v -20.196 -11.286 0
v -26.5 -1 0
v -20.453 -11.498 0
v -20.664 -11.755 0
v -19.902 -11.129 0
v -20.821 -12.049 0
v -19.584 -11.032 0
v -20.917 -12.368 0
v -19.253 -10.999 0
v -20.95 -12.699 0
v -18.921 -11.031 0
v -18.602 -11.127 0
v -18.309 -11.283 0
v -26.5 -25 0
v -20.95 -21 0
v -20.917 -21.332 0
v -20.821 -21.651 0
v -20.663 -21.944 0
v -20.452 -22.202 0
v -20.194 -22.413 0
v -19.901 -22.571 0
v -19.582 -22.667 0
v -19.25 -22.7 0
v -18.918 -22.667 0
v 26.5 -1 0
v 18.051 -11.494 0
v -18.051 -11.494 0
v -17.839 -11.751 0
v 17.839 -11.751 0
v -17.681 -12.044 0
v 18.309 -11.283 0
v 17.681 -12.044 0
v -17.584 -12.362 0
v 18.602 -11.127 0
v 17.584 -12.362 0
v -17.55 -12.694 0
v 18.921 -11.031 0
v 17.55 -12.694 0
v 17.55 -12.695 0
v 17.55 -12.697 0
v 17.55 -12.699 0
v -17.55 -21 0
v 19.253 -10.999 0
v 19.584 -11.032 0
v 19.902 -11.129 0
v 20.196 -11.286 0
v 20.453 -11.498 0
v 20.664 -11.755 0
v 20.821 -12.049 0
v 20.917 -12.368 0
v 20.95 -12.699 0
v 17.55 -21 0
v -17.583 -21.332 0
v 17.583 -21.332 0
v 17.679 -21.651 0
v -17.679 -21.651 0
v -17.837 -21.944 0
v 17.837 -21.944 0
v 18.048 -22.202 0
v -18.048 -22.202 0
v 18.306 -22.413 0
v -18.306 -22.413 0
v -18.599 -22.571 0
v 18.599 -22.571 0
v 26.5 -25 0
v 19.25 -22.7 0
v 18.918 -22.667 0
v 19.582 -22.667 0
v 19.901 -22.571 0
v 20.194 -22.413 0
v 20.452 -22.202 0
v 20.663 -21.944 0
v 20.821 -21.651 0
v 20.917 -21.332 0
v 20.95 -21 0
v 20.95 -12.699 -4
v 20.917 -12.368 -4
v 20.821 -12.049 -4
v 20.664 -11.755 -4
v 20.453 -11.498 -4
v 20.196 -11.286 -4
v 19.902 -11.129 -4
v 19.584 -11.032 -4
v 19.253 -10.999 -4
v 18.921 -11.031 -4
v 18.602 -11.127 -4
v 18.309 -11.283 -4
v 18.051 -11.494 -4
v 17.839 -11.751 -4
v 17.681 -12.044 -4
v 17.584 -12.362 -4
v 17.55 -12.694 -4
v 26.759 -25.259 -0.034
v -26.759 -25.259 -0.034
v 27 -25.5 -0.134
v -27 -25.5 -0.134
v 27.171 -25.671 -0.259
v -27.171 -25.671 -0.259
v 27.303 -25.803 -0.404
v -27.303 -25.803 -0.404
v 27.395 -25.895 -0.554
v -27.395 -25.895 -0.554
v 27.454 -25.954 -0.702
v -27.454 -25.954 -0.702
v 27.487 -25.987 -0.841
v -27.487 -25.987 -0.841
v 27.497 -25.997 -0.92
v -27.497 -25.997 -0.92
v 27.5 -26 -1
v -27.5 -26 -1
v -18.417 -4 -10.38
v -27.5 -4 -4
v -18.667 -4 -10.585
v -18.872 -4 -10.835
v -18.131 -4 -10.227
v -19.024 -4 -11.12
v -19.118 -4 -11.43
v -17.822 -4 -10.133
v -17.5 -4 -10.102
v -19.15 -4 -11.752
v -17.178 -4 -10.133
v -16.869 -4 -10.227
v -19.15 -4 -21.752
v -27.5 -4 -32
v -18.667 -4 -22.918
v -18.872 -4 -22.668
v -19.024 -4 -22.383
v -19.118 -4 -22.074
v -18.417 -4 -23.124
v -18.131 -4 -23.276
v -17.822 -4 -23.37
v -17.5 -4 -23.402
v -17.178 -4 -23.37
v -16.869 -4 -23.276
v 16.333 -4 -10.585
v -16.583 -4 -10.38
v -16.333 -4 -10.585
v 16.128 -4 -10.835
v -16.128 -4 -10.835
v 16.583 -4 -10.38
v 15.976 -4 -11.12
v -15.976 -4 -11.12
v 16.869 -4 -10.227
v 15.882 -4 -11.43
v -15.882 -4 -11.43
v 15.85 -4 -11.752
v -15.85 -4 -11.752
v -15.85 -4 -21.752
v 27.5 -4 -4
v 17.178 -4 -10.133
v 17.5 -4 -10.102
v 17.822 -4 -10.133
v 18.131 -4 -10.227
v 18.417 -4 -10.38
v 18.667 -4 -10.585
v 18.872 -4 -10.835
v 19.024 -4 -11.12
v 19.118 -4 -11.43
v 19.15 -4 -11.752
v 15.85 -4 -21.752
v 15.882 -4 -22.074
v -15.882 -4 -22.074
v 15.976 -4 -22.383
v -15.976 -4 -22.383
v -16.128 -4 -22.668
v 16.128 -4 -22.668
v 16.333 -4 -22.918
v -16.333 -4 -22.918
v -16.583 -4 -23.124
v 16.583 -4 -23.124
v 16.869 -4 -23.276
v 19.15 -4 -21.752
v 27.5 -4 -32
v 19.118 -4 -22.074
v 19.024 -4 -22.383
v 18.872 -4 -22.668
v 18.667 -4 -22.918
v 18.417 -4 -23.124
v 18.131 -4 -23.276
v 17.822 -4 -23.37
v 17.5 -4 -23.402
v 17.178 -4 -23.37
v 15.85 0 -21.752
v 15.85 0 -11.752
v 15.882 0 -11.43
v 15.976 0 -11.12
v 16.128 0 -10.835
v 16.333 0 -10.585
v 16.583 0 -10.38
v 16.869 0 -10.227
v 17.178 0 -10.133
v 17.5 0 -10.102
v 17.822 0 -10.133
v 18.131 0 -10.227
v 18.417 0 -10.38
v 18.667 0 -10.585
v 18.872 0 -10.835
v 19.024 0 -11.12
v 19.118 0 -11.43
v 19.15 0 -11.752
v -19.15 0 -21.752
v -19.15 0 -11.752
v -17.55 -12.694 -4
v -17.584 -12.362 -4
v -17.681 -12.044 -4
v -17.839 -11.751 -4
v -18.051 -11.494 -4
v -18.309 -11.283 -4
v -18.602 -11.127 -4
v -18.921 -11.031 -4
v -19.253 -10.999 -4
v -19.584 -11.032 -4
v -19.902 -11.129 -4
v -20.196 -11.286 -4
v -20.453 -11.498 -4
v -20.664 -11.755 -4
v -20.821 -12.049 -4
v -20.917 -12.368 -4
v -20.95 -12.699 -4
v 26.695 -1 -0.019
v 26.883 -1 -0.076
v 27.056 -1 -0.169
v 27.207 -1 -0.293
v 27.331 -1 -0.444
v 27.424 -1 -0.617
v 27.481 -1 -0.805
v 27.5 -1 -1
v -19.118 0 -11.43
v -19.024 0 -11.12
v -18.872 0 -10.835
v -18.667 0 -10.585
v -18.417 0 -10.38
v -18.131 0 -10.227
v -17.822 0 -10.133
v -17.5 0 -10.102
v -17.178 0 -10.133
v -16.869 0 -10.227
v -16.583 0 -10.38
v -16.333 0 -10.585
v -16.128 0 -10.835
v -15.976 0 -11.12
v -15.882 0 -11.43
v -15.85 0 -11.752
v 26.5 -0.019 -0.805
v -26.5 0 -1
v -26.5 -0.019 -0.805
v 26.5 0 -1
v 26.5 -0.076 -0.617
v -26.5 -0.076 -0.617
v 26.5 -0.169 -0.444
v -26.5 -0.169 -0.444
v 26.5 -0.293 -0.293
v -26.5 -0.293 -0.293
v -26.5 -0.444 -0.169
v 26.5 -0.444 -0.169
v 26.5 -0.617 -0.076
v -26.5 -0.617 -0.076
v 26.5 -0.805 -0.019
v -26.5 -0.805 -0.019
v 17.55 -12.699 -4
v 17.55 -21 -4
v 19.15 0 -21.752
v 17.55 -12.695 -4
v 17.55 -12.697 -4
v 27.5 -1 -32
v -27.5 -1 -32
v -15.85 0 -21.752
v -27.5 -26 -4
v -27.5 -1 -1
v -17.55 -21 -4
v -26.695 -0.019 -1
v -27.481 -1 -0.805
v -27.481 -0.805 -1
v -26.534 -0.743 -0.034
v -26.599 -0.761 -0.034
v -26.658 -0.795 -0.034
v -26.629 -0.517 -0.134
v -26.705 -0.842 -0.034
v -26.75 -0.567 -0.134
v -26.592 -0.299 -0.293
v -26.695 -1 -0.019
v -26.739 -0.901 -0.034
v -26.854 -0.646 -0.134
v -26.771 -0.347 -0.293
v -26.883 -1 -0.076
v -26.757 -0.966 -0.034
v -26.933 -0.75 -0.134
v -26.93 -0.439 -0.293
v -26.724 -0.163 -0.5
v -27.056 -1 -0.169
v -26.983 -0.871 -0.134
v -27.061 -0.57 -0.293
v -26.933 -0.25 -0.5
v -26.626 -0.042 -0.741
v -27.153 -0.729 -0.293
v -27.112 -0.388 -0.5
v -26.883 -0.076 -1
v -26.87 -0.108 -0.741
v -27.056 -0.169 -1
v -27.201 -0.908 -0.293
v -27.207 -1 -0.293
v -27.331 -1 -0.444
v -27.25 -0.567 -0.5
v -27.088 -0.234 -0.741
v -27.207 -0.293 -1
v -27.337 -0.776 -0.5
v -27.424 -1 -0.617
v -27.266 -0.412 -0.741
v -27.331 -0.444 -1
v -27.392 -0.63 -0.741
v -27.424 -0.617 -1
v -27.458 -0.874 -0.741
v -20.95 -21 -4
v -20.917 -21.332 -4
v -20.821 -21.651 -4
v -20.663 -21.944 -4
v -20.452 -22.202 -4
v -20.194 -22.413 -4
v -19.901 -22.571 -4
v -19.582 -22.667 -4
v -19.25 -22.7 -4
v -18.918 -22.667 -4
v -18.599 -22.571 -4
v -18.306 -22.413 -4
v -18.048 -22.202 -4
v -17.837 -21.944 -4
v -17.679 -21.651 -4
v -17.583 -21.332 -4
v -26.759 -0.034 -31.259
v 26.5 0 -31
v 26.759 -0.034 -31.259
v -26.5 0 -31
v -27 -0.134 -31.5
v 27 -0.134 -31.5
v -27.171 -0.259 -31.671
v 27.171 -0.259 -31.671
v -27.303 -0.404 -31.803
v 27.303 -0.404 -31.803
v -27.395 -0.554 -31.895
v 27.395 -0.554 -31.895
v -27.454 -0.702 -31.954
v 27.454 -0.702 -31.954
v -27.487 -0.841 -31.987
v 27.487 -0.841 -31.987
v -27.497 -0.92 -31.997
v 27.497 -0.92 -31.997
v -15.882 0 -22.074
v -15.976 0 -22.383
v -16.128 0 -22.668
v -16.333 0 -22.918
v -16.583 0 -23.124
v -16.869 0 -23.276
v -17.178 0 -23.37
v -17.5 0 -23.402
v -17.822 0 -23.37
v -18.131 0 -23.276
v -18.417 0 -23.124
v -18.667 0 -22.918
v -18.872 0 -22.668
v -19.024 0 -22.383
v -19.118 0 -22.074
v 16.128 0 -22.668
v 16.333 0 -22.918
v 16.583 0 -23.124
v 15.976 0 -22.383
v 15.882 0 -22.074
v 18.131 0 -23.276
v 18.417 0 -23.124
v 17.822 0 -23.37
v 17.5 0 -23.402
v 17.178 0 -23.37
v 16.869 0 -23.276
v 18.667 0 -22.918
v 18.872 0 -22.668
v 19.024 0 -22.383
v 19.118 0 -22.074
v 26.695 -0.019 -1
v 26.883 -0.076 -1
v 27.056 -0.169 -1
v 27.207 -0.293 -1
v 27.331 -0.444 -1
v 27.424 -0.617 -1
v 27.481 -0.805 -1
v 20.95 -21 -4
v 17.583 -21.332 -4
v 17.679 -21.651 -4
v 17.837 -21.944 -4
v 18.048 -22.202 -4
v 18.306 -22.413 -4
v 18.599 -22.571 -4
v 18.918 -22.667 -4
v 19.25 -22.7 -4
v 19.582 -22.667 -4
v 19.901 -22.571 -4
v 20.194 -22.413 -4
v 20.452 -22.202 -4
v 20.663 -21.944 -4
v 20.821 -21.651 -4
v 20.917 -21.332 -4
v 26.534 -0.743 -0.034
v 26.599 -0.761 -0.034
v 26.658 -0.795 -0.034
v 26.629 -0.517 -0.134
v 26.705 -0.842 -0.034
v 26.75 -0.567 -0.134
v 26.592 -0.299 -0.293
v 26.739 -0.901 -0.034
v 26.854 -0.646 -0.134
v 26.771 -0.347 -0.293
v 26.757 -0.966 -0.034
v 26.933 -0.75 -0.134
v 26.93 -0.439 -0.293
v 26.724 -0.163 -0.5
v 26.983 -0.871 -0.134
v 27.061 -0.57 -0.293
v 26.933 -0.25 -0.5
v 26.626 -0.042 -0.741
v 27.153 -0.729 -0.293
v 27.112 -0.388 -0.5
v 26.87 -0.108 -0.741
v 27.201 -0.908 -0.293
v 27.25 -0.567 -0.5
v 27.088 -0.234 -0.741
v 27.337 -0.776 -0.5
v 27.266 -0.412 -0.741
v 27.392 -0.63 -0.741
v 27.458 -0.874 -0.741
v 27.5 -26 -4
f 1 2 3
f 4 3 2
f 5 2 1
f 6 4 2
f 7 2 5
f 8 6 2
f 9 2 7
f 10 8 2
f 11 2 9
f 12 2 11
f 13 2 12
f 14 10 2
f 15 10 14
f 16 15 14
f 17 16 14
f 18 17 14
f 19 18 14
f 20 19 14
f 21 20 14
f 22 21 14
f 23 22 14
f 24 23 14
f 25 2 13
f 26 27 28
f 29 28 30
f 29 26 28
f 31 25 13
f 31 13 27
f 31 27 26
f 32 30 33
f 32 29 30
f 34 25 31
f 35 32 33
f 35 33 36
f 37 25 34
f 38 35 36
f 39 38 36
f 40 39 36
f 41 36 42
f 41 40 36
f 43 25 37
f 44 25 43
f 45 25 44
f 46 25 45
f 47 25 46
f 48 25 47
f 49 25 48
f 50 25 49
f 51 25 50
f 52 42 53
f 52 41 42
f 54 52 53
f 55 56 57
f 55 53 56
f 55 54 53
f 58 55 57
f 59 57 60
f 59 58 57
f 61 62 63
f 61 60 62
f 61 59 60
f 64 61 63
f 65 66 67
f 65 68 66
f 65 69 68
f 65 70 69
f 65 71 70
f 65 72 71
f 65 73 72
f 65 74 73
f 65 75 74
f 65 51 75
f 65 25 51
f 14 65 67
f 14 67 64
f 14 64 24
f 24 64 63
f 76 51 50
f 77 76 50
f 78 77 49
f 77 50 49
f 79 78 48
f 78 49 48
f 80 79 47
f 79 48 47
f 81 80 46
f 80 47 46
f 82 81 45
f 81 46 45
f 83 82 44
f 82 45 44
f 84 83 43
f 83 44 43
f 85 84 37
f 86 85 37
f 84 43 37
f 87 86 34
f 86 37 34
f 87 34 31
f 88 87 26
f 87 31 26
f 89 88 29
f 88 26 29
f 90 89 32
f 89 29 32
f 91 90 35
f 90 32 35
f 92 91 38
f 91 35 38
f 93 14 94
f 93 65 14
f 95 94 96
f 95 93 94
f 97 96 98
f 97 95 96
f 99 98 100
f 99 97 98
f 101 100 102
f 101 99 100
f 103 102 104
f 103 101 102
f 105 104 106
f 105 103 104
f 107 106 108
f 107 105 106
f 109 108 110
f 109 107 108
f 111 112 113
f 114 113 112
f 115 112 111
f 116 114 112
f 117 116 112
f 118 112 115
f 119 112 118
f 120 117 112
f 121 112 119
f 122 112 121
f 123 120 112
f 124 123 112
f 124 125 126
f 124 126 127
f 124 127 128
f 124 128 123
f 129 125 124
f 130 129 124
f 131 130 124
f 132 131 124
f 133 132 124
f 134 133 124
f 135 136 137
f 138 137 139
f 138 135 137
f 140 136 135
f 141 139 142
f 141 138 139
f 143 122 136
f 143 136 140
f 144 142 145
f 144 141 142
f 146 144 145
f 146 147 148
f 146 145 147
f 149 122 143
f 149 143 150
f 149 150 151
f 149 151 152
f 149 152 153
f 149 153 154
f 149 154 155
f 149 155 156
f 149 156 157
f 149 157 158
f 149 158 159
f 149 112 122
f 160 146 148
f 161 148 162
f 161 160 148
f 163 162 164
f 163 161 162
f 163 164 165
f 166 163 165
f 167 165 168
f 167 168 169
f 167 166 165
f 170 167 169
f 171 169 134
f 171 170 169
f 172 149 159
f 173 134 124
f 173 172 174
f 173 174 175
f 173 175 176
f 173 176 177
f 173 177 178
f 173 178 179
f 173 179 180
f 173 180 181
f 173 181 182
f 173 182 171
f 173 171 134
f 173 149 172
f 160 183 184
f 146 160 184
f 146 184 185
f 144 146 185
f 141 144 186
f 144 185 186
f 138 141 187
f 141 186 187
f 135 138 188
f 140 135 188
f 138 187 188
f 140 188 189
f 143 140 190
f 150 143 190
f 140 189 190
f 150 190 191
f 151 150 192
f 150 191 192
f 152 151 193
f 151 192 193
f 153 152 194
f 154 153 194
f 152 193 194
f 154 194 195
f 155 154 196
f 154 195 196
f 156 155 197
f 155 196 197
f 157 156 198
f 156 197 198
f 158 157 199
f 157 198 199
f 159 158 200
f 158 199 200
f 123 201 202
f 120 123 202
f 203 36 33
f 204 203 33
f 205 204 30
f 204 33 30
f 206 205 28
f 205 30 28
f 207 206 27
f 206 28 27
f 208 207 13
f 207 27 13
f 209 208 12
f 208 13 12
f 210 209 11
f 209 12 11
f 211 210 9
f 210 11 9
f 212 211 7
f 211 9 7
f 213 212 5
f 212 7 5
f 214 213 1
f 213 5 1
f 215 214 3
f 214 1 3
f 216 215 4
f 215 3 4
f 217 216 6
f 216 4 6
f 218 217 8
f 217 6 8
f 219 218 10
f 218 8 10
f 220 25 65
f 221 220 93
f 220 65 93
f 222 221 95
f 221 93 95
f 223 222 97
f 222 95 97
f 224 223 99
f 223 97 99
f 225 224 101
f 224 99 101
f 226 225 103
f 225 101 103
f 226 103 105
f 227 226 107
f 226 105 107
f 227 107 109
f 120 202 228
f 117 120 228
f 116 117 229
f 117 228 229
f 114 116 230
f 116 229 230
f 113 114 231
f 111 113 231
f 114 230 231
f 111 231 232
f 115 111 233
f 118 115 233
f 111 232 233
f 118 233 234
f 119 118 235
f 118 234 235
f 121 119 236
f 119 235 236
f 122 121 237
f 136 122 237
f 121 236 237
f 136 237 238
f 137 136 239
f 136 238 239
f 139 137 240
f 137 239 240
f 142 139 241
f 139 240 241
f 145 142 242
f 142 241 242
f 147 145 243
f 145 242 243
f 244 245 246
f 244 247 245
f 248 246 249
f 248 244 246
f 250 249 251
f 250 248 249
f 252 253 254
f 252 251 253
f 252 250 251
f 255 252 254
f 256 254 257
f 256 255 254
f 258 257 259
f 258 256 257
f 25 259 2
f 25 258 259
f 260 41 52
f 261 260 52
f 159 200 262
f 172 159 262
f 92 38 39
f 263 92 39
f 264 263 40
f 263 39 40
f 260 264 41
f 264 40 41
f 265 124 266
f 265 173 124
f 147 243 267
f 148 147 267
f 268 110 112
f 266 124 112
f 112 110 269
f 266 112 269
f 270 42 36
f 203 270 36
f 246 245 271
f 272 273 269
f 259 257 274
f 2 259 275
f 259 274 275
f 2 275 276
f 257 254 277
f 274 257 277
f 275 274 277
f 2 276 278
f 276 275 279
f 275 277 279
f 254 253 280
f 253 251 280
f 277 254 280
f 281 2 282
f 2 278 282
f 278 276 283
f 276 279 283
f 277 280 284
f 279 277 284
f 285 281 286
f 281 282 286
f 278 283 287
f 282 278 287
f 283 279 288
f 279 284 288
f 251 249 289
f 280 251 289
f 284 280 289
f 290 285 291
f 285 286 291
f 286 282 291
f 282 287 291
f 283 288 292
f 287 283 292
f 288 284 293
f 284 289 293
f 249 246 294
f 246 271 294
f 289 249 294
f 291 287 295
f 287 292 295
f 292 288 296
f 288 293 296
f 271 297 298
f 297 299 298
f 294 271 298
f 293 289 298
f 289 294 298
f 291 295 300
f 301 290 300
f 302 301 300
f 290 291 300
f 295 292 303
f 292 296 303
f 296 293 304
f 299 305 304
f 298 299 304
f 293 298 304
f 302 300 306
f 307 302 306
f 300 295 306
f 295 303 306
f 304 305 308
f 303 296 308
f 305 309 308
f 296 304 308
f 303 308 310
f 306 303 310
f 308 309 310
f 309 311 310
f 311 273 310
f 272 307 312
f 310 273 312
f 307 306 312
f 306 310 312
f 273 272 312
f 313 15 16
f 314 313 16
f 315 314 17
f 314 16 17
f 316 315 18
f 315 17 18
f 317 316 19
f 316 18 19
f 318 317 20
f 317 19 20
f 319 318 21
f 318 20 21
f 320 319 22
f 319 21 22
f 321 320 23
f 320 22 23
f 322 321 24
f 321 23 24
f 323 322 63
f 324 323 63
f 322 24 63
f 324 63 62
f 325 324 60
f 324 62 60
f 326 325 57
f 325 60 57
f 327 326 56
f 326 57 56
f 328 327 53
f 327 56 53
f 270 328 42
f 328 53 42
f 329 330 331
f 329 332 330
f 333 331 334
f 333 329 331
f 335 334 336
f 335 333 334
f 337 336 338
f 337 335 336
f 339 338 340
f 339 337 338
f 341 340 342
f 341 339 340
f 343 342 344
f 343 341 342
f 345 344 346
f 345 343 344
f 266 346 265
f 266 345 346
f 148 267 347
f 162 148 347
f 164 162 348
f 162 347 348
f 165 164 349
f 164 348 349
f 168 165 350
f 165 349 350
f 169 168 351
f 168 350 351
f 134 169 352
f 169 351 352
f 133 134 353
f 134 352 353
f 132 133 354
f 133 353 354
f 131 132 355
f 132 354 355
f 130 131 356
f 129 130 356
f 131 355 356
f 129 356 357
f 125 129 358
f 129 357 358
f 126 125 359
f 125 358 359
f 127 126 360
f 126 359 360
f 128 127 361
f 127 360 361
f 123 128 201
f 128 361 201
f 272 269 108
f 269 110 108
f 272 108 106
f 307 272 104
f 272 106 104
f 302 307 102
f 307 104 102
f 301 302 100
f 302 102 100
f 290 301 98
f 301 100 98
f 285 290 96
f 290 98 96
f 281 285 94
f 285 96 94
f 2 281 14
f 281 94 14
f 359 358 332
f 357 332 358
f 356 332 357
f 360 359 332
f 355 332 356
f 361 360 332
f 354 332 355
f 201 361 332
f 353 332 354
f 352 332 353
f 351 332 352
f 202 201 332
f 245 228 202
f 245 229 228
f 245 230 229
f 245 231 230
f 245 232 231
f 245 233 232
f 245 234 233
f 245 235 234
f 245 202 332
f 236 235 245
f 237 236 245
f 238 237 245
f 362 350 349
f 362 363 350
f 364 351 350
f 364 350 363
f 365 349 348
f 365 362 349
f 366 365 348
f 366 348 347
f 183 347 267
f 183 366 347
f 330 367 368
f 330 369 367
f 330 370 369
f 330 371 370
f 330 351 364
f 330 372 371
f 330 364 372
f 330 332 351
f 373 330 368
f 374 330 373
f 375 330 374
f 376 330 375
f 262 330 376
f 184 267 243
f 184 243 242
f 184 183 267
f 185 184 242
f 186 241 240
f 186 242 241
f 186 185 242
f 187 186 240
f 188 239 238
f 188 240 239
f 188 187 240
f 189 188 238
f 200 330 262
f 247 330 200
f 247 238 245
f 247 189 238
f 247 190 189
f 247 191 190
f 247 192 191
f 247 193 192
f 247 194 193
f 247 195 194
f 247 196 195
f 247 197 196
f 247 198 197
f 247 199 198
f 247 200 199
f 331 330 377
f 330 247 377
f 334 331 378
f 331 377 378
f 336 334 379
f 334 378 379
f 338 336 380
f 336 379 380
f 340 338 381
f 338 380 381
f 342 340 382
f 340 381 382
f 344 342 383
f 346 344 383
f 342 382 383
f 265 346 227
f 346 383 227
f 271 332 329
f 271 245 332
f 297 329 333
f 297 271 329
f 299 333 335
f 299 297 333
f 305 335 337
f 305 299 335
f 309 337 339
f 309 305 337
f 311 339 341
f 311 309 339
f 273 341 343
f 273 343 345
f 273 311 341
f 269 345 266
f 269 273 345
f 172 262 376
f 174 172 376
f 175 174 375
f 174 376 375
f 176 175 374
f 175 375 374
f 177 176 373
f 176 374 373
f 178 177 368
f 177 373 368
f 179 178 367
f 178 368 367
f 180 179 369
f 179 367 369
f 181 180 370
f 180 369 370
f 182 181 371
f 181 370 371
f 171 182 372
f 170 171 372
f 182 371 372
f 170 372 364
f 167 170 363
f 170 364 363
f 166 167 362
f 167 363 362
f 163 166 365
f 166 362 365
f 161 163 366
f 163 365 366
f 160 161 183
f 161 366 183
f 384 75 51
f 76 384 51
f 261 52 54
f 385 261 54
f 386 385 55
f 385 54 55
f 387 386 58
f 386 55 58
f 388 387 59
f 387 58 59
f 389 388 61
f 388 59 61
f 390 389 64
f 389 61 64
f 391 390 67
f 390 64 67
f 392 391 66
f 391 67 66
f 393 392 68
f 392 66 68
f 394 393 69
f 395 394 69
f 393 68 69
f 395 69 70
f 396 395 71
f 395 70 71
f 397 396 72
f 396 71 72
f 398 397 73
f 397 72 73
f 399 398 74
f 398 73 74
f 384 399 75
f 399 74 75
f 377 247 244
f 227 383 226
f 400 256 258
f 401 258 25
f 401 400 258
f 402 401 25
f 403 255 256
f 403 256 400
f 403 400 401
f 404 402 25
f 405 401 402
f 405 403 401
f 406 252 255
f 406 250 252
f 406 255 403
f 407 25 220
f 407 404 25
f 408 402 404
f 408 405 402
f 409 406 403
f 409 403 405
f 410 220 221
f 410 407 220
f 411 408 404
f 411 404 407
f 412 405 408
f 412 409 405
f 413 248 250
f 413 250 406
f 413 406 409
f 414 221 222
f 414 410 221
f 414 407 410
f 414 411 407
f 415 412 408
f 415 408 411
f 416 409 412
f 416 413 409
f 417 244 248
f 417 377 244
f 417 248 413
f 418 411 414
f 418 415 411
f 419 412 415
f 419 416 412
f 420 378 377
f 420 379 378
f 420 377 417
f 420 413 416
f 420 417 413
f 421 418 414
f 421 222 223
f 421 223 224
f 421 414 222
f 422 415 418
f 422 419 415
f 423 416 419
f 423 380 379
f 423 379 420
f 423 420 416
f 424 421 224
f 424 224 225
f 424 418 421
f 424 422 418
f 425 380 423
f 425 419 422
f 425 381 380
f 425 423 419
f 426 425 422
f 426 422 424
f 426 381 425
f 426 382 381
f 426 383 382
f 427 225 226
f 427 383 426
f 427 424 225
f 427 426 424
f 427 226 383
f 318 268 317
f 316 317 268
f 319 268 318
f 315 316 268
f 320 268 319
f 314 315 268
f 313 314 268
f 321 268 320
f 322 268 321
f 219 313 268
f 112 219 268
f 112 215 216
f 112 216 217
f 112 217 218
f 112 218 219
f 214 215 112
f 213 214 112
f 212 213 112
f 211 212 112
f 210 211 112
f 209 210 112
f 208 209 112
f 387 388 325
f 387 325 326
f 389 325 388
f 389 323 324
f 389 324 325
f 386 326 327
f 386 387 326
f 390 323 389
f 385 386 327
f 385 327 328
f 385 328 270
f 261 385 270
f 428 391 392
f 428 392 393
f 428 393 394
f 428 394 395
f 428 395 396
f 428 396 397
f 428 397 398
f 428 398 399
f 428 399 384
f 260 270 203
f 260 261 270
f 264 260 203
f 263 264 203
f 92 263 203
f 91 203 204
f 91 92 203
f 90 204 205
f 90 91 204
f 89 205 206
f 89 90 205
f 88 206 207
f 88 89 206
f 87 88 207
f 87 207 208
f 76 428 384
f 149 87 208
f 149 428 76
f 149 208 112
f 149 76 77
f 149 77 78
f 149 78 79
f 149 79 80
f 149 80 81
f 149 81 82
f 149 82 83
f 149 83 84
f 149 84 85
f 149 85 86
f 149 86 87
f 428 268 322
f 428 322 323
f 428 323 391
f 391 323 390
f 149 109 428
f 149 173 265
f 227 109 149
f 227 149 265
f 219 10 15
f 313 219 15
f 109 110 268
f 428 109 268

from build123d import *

# Parameters (mm, degrees)
F1_DEPTH = 27.5
F3_DEPTH = 32.001
F4_R     = 1
F6_DEPTH = 26.001


# Not quite as in the source:
# - ends of sketch curves that miss each other by under 0.0002 mm in the source are joined
# - a feature names something its author has since deleted; it is built from what else it names


with BuildPart() as f1:
    # F0 (on Right) → F1 (new body, symmetric)
    with BuildSketch(Plane.YZ):
        Polygon((0, -32), (0, 0), (-26, 0), (-26, -4), (-4, -4), (-4, -32), align=None)
    extrude(amount=F1_DEPTH, both=True)

    # F2 (on Top) → F3 (cut, through all)
    with BuildSketch(Plane.XY):
        with BuildLine():
            Line((-17.55, -21), (-20.95, -21))
            ThreePointArc((-20.95, -21), (-19.25, -22.7), (-17.55, -21))
        make_face()
        with BuildLine():
            Line((-20.95, -12.6989117458), (-20.95, -21))
            Line((-20.95, -21), (-17.55, -21))
            Line((-17.55, -21), (-17.55, -12.6989117458))
            Line((-17.55, -12.6989117458), (-17.55, -12.6936758503))
            ThreePointArc((-17.55, -12.6936758503), (-19.2526179384, -10.9989137616), (-20.95, -12.6989117458))
        make_face()
        with BuildLine():
            ThreePointArc((17.55, -21), (19.25, -22.7), (20.95, -21))
            Line((20.95, -21), (17.55, -21))
        make_face()
        with BuildLine():
            Line((17.55, -21), (20.95, -21))
            Line((20.95, -21), (20.95, -12.6989117458))
            ThreePointArc((20.95, -12.6989117458), (19.2526179384, -10.9989137616), (17.5500080631, -12.6936758752))
            ThreePointArc((17.5500080631, -12.6936758752), (17.5500020158, -12.6962938074), (17.55, -12.6989117458))
            Line((17.55, -12.6989117458), (17.55, -21))
        make_face()
    extrude(amount=-F3_DEPTH, mode=Mode.SUBTRACT)

    # F4
    f4_edges = [f1.edges().sort_by_distance(p)[0] for p in [
        (0, 0, -32),
        (-27.5, 0, -16),
        (27.5, 0, -16),
        (0, 0, 0),
        (0, -26, 0),
        (-27.5, -13, 0),
        (27.5, -13, 0),
    ]]
    fillet(f4_edges, radius=F4_R)

    # F5 (on face) → F6 (cut, through all)
    with BuildSketch(Plane(origin=(0, 0, 0), x_dir=(-1, 0, 0), z_dir=(0, 1, 0))):
        with BuildLine():
            Line((15.85, -11.7517232777), (15.85, -21.7517232777))
            ThreePointArc((15.85, -21.7517232777), (17.5, -23.4017232777), (19.15, -21.7517232777))
            Line((19.15, -21.7517232777), (19.15, -11.7517232777))
            ThreePointArc((19.15, -11.7517232777), (17.5, -10.1017232777), (15.85, -11.7517232777))
        make_face()
        with BuildLine():
            ThreePointArc((-19.15, -21.7517232777), (-17.5, -23.4017232777), (-15.85, -21.7517232777))
            Line((-15.85, -21.7517232777), (-15.85, -11.7517232777))
            ThreePointArc((-15.85, -11.7517232777), (-17.5, -10.1017232777), (-19.15, -11.7517232777))
            Line((-19.15, -11.7517232777), (-19.15, -21.7517232777))
        make_face()
    extrude(amount=-F6_DEPTH, mode=Mode.SUBTRACT)


solid = f1.part
